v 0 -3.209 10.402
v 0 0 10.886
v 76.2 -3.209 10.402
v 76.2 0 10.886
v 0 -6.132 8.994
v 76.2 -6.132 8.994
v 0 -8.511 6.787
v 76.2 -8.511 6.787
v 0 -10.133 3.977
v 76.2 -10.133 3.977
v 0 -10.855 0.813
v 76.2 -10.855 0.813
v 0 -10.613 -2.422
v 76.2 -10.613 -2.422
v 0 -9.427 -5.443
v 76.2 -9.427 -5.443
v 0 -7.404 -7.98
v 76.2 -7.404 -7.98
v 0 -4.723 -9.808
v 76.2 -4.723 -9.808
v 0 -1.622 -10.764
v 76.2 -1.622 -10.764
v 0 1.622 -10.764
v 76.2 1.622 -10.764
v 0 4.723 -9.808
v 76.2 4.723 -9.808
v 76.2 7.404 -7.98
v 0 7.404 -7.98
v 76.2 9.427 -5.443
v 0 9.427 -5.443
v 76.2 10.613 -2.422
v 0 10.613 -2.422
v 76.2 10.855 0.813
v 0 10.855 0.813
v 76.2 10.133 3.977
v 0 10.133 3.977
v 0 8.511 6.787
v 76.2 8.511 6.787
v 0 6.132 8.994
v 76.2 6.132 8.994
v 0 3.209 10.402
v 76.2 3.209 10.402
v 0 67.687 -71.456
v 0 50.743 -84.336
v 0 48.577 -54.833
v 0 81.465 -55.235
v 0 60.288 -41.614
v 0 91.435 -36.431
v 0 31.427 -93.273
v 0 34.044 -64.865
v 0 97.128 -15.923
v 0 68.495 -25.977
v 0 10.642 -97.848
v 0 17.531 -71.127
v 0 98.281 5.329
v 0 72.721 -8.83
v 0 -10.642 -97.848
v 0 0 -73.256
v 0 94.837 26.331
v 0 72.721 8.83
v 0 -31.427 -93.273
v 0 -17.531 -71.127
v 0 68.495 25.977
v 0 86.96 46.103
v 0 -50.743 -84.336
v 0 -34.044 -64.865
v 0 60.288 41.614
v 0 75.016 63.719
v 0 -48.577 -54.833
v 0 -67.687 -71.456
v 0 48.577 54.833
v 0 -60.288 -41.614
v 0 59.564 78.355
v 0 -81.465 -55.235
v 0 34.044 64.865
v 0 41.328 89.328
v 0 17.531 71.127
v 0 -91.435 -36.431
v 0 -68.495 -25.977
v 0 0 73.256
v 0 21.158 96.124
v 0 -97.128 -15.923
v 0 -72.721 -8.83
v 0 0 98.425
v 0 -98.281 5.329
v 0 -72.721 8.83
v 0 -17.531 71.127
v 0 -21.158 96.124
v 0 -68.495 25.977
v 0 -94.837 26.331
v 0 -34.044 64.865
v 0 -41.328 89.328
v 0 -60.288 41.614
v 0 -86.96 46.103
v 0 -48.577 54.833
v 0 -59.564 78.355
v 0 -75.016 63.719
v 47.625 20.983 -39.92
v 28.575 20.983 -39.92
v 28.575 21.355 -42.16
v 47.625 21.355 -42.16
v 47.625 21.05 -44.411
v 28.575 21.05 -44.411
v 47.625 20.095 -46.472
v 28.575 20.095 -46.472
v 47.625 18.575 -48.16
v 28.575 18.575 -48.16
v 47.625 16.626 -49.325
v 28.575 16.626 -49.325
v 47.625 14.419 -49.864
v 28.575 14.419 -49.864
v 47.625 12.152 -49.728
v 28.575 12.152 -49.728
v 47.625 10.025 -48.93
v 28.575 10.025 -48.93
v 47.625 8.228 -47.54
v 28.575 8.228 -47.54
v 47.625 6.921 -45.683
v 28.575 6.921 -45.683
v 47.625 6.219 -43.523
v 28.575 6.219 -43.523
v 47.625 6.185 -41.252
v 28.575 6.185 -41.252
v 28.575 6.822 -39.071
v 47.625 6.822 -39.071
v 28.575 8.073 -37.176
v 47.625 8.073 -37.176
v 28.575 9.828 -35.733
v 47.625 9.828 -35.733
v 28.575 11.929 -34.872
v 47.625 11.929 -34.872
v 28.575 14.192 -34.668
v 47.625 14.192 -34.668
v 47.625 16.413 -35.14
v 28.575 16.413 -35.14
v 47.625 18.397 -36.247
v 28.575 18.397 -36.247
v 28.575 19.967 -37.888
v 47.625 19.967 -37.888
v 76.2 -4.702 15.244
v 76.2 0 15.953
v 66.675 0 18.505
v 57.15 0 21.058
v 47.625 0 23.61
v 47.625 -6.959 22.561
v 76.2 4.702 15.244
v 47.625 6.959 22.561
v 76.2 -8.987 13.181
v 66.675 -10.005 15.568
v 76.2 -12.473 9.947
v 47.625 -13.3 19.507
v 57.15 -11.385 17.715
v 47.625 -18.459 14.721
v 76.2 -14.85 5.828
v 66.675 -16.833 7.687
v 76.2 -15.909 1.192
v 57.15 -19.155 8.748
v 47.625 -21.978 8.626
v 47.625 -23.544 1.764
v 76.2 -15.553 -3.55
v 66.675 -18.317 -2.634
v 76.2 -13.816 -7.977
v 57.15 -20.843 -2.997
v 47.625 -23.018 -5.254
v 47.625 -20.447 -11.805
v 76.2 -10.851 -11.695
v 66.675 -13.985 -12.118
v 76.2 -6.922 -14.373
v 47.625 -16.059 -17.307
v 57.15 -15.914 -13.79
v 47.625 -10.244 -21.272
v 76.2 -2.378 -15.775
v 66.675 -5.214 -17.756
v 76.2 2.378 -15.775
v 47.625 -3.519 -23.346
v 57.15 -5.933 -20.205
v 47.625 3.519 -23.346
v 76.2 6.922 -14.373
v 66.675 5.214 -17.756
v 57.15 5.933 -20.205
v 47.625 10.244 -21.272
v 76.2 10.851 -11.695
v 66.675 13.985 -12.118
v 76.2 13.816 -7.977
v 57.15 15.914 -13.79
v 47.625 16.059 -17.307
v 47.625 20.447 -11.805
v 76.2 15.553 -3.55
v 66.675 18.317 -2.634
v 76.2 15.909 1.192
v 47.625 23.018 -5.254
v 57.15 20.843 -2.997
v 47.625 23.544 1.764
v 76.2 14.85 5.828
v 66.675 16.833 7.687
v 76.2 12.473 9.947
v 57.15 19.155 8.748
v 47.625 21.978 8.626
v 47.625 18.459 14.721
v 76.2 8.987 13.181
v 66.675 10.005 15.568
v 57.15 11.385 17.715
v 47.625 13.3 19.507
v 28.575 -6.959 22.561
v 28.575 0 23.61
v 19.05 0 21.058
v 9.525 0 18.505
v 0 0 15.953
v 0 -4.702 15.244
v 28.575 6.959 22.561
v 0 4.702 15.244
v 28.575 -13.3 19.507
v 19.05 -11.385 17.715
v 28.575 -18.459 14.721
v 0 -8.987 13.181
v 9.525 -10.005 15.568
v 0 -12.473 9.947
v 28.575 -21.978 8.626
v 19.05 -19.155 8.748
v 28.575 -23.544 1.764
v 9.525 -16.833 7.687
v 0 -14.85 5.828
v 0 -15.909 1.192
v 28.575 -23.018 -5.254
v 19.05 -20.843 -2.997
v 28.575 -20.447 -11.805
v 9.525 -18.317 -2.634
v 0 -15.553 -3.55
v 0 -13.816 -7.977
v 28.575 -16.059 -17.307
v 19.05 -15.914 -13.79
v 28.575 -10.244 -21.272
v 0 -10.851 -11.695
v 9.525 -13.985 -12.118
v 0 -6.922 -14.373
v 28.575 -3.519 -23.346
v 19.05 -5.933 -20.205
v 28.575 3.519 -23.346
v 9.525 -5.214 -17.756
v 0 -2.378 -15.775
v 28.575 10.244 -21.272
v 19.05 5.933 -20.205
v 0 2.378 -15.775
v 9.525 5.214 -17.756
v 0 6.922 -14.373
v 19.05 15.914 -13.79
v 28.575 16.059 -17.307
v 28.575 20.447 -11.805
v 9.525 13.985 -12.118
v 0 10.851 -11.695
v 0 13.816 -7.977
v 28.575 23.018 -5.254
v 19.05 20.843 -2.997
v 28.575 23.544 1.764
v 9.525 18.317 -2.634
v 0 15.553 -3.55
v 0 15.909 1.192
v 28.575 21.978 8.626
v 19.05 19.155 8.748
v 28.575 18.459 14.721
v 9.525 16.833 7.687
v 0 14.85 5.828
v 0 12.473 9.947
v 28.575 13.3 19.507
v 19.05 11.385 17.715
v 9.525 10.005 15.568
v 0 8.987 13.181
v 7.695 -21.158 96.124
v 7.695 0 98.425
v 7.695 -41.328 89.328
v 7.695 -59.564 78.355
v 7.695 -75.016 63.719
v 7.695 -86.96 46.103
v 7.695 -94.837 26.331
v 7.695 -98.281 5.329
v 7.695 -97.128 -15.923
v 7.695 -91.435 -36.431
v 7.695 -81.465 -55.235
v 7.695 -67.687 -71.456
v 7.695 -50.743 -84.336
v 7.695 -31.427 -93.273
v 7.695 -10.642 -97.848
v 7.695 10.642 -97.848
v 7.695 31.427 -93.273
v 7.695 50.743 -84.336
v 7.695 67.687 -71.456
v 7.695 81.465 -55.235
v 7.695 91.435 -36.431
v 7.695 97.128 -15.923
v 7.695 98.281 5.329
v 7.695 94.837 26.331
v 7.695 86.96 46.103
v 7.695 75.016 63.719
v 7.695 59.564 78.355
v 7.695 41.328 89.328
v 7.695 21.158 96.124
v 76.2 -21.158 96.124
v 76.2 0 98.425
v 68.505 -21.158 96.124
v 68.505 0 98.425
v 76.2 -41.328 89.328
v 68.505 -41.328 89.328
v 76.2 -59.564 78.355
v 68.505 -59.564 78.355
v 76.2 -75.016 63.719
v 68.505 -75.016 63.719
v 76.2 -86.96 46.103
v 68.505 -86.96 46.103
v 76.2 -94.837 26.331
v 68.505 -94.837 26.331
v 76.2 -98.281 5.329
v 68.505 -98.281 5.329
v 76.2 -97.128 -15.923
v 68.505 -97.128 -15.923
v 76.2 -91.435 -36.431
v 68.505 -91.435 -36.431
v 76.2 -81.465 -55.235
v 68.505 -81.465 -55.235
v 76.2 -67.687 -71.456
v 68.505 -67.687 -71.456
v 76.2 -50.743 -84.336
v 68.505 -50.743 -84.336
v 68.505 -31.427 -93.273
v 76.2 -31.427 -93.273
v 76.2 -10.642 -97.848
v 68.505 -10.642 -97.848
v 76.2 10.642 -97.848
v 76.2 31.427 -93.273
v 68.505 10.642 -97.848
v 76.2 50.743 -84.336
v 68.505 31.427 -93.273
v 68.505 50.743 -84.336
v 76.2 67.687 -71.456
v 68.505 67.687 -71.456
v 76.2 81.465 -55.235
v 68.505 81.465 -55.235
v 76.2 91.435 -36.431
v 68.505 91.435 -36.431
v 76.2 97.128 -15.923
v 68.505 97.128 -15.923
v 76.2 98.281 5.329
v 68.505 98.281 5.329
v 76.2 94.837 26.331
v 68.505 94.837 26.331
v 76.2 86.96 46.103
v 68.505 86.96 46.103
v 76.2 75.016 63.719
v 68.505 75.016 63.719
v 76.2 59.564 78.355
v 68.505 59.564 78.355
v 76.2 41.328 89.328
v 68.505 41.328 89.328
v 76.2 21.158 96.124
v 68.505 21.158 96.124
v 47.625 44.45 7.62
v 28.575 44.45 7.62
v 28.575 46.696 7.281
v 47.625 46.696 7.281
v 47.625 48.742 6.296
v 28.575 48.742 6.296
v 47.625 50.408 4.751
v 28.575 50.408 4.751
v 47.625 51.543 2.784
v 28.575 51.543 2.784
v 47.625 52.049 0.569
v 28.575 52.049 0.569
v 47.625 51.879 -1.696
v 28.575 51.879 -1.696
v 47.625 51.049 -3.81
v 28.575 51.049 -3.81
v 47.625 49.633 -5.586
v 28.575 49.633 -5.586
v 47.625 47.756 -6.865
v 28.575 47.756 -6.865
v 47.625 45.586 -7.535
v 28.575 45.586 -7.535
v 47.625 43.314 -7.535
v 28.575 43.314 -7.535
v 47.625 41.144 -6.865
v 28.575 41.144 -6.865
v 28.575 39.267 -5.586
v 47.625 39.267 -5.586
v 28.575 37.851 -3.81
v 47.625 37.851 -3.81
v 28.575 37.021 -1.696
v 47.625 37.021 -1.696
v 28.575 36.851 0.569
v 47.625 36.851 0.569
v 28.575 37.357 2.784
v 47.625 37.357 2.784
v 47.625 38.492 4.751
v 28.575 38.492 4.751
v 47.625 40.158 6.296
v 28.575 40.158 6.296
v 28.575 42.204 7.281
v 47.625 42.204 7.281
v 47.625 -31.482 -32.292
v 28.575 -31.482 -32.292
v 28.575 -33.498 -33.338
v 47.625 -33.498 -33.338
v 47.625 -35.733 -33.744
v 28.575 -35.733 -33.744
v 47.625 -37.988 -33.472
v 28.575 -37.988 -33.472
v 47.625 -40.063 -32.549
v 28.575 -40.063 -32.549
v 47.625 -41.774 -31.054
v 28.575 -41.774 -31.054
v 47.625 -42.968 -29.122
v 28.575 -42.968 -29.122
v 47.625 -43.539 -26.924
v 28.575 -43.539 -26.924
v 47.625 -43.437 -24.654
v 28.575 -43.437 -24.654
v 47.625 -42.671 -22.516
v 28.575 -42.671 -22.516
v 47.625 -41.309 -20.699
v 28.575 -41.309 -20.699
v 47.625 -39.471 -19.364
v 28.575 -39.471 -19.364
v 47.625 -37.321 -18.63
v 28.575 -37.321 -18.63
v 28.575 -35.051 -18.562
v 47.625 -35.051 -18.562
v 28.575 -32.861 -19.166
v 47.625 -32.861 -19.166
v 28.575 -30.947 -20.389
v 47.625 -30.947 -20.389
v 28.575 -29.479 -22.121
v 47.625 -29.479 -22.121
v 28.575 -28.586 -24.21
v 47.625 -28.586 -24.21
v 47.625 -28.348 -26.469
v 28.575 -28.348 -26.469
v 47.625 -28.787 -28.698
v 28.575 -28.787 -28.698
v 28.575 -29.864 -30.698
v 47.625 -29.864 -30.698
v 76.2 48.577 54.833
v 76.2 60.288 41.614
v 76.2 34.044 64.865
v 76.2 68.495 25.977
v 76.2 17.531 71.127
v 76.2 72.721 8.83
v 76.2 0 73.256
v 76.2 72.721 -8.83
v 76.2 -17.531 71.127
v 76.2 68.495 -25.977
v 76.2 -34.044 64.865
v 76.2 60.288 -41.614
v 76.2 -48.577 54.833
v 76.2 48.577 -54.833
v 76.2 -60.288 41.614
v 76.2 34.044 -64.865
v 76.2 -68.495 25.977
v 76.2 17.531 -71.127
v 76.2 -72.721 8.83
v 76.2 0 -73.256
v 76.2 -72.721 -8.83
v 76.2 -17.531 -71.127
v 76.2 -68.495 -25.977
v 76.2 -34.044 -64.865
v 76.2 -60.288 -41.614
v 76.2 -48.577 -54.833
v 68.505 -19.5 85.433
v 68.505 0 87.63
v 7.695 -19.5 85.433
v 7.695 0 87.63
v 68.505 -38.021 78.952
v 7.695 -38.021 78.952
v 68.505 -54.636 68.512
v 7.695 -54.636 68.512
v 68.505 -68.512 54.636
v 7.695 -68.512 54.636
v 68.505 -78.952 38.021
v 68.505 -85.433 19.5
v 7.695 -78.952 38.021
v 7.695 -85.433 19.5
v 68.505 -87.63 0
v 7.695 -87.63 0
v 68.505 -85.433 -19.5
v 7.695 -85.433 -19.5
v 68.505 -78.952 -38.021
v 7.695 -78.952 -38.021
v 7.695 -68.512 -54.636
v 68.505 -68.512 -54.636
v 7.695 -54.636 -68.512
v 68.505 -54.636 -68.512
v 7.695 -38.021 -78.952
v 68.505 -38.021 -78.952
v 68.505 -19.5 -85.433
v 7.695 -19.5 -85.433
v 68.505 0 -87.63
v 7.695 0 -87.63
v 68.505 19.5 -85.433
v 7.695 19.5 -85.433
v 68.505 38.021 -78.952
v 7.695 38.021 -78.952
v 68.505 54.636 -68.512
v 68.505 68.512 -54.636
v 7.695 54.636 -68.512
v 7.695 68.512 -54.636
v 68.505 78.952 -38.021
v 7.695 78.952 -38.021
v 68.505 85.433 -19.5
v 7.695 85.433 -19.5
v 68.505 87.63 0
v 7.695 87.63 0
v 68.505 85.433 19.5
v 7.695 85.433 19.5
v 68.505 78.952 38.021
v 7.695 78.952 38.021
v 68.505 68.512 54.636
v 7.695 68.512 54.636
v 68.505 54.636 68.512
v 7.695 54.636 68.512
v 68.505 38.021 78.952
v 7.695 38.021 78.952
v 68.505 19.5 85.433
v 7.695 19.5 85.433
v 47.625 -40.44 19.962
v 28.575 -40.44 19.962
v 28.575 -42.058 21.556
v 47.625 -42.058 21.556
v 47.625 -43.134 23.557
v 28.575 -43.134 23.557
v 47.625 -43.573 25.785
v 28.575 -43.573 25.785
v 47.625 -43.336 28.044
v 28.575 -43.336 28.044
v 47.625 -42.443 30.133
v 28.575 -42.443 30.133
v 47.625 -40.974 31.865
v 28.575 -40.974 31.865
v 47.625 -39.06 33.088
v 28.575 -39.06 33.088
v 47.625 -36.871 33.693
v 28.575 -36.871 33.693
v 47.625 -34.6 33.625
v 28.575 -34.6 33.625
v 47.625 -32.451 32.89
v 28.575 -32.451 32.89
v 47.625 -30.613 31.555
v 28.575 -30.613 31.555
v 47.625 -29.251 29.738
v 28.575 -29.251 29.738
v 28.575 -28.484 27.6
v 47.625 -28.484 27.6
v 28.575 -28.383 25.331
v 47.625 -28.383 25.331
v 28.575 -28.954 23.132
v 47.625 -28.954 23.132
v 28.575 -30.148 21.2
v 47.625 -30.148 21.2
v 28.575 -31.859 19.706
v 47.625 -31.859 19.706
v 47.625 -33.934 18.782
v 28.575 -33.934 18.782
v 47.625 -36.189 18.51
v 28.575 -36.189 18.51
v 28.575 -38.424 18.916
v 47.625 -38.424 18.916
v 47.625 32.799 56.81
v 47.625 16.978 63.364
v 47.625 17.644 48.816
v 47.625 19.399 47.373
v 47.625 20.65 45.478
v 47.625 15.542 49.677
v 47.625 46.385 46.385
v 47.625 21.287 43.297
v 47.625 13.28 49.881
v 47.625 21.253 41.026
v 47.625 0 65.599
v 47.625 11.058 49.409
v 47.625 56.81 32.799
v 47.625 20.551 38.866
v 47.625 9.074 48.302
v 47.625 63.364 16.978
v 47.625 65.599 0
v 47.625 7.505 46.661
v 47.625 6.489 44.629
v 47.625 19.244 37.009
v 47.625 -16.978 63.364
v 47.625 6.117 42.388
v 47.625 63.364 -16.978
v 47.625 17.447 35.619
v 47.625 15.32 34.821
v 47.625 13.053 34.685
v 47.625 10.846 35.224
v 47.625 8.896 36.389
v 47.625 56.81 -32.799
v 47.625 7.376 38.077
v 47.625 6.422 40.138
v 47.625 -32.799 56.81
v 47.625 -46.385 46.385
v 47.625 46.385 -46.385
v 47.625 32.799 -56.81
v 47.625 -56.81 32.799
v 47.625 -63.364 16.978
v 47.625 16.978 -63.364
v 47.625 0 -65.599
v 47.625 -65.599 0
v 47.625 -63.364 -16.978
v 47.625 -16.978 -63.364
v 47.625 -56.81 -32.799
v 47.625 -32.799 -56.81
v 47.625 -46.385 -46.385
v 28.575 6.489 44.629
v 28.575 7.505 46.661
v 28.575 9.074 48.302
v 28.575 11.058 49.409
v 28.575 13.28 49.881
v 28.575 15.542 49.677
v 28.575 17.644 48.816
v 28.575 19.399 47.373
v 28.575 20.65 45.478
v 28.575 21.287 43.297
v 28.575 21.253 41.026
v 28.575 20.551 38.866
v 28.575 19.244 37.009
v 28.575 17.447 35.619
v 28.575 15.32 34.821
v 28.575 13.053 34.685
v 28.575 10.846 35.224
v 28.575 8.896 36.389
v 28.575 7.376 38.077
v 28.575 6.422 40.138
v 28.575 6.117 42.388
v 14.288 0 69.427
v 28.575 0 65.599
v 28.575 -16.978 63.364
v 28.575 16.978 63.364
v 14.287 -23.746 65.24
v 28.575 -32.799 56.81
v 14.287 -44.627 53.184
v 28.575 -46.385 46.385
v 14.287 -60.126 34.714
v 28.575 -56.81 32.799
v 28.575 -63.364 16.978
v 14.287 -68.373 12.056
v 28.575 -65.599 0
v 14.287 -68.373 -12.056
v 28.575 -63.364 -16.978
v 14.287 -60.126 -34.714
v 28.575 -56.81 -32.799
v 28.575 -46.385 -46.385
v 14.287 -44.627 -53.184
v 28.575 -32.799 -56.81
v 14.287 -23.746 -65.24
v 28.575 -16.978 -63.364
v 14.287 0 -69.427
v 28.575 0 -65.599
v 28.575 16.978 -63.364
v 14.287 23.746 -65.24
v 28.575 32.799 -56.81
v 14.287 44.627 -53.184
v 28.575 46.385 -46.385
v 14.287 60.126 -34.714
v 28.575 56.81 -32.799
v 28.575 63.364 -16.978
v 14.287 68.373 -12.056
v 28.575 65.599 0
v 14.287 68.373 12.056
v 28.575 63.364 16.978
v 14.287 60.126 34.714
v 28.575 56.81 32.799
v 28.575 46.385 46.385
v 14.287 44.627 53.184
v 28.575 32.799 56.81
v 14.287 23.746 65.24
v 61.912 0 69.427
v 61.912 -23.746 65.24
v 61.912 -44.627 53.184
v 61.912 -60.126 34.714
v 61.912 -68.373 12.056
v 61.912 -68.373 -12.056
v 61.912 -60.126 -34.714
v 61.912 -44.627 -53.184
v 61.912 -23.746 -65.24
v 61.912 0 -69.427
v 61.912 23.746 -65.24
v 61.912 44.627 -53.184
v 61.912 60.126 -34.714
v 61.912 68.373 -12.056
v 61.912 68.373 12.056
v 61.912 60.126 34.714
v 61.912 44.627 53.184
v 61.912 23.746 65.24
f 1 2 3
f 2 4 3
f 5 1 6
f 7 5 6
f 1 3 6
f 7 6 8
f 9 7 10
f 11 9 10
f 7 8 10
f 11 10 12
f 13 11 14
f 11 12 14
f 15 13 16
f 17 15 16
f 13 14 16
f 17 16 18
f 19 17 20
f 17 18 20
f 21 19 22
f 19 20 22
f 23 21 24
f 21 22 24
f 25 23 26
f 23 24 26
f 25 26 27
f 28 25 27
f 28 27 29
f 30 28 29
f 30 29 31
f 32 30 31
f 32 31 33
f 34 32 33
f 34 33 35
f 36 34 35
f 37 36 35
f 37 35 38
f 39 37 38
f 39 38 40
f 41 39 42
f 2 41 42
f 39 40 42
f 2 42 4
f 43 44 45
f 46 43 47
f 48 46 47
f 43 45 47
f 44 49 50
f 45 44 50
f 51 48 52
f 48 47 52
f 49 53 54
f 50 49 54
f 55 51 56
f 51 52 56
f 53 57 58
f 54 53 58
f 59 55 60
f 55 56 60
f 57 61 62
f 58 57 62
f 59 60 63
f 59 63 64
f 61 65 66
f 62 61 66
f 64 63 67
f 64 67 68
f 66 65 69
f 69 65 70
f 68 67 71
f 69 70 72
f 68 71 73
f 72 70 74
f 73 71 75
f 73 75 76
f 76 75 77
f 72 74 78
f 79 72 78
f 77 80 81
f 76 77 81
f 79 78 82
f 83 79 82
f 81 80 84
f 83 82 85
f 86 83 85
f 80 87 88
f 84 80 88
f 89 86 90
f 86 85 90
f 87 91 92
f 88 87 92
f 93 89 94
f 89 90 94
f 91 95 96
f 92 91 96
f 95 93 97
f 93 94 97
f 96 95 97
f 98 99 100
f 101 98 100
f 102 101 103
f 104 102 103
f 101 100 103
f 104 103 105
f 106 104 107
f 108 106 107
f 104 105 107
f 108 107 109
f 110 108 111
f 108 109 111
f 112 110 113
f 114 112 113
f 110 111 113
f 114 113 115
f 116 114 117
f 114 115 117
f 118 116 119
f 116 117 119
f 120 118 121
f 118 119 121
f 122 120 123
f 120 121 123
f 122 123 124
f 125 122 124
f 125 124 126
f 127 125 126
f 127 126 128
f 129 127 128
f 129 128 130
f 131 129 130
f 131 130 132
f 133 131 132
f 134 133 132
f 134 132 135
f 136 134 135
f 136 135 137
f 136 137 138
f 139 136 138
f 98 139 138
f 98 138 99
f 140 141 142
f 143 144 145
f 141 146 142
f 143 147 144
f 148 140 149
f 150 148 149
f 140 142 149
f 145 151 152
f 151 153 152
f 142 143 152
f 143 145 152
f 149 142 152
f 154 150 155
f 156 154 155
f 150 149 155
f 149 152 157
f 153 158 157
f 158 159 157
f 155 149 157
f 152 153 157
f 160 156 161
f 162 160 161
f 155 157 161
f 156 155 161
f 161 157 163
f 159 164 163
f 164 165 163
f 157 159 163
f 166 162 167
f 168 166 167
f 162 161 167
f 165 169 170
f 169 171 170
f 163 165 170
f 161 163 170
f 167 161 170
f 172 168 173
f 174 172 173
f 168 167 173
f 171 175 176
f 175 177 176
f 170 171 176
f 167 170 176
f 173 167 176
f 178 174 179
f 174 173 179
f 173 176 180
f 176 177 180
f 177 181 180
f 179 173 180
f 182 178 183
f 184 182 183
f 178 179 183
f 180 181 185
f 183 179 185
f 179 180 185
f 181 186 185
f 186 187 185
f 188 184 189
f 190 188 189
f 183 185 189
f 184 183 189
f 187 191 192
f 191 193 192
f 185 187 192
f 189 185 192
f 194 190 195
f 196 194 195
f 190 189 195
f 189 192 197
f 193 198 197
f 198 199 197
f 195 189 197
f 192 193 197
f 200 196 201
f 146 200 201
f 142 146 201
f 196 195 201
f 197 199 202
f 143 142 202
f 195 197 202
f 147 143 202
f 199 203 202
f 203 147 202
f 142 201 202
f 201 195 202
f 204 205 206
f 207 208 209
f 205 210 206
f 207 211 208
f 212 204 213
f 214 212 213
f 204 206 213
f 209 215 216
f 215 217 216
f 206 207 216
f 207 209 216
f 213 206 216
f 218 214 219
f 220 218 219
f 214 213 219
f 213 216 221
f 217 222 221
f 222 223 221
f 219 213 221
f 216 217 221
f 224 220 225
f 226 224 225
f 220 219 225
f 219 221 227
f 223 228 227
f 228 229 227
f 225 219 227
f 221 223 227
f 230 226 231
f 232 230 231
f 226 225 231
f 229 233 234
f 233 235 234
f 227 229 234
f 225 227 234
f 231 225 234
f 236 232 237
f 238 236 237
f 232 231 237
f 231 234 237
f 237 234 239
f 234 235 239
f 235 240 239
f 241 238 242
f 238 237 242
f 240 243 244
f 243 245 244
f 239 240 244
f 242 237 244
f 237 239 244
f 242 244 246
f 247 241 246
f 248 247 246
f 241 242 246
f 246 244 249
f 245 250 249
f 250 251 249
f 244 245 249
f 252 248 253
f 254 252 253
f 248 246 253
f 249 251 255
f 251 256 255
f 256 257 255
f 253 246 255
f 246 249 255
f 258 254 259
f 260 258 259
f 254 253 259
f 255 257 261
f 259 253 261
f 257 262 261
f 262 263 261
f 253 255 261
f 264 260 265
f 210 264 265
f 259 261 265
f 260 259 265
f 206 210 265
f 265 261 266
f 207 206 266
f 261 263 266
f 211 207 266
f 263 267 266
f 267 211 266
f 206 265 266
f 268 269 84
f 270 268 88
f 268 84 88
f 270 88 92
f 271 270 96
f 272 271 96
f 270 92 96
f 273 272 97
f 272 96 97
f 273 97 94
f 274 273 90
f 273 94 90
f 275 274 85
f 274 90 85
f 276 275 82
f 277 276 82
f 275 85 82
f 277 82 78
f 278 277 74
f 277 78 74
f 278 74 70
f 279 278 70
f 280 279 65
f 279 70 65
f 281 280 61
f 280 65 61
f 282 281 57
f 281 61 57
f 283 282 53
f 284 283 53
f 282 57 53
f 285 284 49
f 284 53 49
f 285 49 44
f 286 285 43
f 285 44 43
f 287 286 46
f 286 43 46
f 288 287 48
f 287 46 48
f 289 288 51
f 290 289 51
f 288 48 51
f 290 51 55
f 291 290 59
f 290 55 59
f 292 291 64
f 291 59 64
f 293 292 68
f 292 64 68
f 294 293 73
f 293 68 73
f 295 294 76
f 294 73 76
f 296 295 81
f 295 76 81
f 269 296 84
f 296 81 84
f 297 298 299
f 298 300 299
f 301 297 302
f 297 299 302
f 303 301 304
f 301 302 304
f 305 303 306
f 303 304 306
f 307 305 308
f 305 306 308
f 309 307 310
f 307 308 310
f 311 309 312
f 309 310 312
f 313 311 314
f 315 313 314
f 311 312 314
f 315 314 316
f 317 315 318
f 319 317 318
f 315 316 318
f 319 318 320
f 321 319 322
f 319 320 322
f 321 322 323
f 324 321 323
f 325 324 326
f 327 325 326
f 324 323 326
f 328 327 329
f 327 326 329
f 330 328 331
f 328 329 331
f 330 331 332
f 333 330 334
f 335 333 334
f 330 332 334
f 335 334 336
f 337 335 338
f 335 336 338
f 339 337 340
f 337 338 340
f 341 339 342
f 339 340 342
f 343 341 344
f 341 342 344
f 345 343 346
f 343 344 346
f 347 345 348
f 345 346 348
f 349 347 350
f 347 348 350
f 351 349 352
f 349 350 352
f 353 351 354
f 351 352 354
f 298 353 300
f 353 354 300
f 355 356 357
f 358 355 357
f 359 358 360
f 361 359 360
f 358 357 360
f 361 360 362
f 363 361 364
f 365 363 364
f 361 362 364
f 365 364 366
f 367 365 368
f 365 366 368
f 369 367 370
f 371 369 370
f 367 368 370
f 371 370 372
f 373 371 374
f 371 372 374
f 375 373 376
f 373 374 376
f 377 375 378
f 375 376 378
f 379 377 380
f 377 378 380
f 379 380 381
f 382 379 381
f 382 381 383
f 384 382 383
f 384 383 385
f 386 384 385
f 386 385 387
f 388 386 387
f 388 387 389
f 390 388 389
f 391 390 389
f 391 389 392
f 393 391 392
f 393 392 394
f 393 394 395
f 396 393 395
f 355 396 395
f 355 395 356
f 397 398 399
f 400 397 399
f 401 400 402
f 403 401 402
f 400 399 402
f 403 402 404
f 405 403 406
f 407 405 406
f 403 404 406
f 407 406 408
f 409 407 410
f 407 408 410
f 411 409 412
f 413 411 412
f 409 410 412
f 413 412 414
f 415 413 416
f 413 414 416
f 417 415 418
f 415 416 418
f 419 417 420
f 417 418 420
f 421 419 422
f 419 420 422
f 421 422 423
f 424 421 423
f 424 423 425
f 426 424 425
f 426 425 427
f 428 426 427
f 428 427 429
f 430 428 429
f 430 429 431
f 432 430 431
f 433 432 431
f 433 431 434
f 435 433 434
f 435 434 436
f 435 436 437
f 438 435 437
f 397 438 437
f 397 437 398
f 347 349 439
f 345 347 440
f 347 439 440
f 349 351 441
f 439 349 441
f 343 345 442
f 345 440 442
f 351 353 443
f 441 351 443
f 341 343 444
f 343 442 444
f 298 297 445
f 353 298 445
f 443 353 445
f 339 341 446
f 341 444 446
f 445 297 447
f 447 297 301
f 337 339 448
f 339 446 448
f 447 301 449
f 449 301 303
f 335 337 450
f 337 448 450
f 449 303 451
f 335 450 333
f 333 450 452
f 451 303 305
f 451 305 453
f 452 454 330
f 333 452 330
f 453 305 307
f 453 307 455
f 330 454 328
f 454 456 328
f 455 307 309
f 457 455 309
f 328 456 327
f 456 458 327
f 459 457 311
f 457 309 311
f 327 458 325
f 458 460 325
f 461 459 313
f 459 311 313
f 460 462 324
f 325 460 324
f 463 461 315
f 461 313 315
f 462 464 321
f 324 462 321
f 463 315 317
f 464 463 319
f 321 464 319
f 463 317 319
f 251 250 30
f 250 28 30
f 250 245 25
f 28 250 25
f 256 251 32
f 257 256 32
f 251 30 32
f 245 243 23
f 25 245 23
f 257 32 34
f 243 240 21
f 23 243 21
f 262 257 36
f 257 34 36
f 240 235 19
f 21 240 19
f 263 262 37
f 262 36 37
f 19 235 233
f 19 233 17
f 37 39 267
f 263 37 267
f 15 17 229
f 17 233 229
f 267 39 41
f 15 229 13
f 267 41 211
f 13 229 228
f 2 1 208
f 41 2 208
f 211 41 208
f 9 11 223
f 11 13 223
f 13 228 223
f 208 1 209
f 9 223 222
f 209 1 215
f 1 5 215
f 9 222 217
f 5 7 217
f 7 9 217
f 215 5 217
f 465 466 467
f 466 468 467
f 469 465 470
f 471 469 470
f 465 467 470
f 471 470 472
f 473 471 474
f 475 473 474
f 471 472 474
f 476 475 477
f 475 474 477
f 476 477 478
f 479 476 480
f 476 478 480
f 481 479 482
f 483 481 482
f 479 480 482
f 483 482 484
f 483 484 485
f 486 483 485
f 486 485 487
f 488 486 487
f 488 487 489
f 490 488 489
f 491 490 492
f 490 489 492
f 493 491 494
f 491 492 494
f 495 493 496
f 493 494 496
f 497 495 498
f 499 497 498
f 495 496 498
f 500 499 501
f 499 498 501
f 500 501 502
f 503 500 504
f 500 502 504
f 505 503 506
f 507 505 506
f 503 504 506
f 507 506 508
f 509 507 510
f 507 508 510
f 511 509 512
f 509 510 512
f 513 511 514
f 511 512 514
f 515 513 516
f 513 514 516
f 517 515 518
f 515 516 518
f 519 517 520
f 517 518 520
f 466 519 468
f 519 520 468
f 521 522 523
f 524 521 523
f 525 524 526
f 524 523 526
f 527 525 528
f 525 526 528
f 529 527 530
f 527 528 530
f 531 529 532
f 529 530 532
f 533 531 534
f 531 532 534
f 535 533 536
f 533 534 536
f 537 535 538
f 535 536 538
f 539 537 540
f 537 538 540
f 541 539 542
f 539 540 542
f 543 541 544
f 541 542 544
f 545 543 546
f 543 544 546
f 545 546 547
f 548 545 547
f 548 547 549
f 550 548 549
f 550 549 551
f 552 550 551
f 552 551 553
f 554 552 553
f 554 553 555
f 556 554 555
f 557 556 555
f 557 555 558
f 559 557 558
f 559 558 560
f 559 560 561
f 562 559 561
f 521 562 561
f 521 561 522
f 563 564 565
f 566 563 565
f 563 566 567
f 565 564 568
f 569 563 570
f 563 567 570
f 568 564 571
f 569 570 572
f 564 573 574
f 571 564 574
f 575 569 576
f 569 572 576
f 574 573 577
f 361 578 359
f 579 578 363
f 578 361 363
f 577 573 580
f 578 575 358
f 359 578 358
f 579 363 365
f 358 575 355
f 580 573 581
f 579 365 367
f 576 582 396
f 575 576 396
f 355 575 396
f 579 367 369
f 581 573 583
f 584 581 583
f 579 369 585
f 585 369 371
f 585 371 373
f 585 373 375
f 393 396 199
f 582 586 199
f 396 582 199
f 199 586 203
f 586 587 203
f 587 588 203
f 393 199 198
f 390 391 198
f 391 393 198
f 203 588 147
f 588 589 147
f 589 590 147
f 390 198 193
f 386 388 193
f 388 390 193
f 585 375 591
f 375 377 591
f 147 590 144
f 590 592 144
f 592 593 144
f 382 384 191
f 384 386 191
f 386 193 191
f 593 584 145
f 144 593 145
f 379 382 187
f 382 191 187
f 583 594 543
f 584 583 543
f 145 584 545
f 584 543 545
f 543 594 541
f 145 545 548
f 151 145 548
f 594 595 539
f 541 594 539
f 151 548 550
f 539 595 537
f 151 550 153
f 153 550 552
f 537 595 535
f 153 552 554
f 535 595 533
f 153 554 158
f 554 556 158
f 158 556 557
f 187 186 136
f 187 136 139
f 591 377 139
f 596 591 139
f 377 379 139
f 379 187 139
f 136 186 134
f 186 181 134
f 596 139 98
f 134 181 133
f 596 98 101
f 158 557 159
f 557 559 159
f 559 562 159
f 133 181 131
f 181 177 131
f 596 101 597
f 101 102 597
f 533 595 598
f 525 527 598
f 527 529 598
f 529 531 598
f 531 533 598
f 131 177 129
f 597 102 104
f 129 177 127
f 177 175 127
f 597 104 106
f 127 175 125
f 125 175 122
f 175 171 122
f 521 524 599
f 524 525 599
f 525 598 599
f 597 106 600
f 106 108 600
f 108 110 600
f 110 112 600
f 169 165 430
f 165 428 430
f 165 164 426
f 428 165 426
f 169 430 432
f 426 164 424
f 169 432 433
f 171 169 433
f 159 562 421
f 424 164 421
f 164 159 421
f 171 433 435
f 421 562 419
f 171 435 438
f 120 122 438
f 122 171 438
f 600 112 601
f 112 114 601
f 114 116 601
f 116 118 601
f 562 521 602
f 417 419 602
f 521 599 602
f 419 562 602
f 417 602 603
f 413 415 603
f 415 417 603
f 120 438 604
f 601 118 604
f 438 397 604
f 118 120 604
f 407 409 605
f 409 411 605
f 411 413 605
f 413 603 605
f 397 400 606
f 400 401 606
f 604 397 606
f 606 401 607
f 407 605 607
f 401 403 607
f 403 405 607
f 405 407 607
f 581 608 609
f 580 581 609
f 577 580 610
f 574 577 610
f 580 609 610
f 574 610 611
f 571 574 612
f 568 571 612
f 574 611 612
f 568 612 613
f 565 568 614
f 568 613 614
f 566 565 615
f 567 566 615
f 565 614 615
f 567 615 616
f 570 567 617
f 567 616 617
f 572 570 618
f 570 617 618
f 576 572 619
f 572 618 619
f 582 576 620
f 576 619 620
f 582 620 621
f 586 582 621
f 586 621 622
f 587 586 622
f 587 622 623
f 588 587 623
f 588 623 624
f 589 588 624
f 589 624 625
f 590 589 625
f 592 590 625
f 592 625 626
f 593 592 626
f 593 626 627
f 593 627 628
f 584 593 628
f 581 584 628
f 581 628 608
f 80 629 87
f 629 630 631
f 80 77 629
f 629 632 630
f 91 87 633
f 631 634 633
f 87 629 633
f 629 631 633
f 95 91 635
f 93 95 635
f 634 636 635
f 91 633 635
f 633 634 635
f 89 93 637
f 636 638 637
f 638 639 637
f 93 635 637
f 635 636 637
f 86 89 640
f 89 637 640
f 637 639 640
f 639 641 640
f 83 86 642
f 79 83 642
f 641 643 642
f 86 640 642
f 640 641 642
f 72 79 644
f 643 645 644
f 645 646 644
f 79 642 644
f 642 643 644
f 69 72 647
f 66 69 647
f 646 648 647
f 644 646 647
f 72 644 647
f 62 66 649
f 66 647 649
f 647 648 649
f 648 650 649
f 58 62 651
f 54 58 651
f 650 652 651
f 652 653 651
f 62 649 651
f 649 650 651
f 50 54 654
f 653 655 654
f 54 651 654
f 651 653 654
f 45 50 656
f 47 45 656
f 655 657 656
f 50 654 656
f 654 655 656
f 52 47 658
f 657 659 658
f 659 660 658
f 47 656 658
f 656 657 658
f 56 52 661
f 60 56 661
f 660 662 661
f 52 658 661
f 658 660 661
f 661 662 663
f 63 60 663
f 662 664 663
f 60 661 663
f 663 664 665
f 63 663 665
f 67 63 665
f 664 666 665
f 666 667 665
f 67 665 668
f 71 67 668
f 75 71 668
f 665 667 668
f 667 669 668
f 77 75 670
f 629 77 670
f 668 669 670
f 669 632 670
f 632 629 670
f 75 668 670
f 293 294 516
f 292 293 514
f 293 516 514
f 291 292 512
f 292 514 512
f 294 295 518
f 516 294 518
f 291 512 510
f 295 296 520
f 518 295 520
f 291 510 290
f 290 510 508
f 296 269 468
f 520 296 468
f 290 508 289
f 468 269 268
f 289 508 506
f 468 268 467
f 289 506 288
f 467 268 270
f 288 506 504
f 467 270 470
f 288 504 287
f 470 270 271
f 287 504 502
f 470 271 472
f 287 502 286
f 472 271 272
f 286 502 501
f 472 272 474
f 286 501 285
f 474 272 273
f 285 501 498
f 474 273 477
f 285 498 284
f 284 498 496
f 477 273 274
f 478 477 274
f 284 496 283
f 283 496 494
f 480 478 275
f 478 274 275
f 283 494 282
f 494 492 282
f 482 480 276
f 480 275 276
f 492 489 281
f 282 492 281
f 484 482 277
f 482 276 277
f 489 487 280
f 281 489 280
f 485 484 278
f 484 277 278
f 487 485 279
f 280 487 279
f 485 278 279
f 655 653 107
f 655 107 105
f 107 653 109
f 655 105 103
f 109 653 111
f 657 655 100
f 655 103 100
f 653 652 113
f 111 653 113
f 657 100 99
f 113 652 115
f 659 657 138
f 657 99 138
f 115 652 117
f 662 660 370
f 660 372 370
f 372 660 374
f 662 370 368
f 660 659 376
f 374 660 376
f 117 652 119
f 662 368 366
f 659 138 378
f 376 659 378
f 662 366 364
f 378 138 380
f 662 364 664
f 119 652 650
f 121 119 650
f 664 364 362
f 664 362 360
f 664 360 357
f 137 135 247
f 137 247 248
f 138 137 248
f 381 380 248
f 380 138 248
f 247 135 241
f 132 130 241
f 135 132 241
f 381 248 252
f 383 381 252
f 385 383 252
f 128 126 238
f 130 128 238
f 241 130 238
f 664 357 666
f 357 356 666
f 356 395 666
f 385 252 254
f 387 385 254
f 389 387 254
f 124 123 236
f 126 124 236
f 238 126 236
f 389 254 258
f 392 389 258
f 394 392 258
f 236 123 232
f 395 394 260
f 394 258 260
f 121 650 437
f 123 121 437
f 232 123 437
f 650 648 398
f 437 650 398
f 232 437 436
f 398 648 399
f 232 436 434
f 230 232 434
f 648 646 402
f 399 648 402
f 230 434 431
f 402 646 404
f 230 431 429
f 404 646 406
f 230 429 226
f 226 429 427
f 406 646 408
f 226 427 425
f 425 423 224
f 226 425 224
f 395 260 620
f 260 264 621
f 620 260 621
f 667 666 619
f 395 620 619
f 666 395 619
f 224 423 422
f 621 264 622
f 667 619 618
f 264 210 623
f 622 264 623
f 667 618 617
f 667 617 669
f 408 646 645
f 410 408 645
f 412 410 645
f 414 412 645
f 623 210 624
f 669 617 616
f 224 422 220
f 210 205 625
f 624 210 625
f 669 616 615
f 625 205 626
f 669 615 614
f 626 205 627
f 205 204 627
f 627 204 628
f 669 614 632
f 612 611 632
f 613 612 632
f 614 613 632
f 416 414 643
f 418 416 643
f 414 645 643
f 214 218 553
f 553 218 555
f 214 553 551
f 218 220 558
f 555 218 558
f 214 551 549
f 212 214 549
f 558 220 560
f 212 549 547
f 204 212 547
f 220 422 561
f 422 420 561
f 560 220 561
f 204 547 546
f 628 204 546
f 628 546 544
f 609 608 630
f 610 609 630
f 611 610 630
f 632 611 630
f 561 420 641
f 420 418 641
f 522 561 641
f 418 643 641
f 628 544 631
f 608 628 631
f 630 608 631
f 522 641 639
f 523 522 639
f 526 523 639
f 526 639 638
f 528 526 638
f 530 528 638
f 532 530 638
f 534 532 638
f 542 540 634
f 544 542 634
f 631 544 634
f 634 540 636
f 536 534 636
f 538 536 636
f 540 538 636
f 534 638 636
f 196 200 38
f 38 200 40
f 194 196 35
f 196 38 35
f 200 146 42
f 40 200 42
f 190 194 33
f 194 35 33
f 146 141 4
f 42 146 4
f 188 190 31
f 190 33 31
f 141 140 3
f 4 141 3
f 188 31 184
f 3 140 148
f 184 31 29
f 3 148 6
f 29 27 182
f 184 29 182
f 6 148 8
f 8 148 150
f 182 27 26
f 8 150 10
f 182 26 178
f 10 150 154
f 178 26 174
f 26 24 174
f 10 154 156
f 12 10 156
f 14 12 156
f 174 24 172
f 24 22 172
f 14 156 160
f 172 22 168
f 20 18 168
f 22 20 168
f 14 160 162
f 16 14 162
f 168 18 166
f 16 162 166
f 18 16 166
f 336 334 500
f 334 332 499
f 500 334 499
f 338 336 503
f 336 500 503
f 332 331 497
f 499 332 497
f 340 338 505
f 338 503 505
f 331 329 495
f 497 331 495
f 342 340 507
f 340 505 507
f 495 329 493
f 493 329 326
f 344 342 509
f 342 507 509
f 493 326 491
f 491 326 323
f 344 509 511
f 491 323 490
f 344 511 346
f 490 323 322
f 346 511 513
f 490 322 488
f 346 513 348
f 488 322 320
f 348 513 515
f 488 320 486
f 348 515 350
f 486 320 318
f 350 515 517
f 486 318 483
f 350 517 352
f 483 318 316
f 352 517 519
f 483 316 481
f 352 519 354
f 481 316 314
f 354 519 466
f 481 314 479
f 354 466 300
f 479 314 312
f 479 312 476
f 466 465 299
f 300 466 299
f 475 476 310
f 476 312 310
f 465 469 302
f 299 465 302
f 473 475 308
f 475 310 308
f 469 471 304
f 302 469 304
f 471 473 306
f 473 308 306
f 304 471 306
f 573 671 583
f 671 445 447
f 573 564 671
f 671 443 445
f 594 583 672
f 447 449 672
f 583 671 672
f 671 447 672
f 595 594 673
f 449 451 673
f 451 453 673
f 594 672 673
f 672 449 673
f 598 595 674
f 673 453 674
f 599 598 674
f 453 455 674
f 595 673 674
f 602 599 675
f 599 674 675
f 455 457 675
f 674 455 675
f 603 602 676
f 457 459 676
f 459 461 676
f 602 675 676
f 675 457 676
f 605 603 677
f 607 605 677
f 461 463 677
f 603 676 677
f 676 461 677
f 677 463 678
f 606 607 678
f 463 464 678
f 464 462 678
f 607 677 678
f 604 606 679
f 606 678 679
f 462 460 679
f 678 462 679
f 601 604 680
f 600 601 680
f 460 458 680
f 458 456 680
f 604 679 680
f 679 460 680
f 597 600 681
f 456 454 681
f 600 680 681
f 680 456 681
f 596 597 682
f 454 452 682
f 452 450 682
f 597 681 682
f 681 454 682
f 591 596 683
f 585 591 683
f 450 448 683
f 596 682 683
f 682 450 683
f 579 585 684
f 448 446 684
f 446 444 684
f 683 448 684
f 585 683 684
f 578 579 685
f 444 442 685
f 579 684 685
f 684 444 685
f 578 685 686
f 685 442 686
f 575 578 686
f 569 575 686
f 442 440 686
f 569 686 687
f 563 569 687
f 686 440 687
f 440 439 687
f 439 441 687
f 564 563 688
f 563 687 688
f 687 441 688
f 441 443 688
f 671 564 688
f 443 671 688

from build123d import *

# Parameters (mm, degrees)
ESBO_O2_R             = 7.62
CORTE_EXTRUS_O1_DEPTH = 162
PADR_OCIRCULAR1_COUNT = 5


with BuildPart() as part:
    # Esboço1 → Revolução1 (revolve)
    with BuildSketch(Plane.XY, mode=Mode.PRIVATE) as revolu_o1_sk:
        Polygon((0, 10.885714286), (76.2, 10.885714286), (76.2, 15.95320197), (47.625, 23.609850144), (47.625, 65.598953797), (76.2, 73.25560197), (76.2, 98.425), (68.504926108, 98.425), (68.504926108, 87.63), (7.695073892, 87.63), (7.695073892, 98.425), (0, 98.425), (0, 73.25560197), (28.575, 65.598953797), (28.575, 23.609850144), (0, 15.95320197), align=None)
    revolve(revolu_o1_sk.sketch.rotate(Axis((0, 0, 0), (1, 0, 0)), 90), axis=Axis((0, 0, 0), (1, 0, 0)))

    # Esboço2 → Corte-extrusão1 (cut)
    with BuildSketch(Plane.ZY.offset(-28.575)):
        with Locations((0, 44.45)):
            Circle(ESBO_O2_R)
    corte_extrus_o1 = extrude(amount=-CORTE_EXTRUS_O1_DEPTH, mode=Mode.SUBTRACT)

    # PadrãoCircular1: Corte-extrusão1 ×5 about axis
    padr_ocircular1_axis = Axis((0, 0, 0), (1, 0, 0))
    for i in range(1, PADR_OCIRCULAR1_COUNT):
        add(corte_extrus_o1.rotate(padr_ocircular1_axis, i * 360 / PADR_OCIRCULAR1_COUNT), mode=Mode.SUBTRACT)


solid = part.part
